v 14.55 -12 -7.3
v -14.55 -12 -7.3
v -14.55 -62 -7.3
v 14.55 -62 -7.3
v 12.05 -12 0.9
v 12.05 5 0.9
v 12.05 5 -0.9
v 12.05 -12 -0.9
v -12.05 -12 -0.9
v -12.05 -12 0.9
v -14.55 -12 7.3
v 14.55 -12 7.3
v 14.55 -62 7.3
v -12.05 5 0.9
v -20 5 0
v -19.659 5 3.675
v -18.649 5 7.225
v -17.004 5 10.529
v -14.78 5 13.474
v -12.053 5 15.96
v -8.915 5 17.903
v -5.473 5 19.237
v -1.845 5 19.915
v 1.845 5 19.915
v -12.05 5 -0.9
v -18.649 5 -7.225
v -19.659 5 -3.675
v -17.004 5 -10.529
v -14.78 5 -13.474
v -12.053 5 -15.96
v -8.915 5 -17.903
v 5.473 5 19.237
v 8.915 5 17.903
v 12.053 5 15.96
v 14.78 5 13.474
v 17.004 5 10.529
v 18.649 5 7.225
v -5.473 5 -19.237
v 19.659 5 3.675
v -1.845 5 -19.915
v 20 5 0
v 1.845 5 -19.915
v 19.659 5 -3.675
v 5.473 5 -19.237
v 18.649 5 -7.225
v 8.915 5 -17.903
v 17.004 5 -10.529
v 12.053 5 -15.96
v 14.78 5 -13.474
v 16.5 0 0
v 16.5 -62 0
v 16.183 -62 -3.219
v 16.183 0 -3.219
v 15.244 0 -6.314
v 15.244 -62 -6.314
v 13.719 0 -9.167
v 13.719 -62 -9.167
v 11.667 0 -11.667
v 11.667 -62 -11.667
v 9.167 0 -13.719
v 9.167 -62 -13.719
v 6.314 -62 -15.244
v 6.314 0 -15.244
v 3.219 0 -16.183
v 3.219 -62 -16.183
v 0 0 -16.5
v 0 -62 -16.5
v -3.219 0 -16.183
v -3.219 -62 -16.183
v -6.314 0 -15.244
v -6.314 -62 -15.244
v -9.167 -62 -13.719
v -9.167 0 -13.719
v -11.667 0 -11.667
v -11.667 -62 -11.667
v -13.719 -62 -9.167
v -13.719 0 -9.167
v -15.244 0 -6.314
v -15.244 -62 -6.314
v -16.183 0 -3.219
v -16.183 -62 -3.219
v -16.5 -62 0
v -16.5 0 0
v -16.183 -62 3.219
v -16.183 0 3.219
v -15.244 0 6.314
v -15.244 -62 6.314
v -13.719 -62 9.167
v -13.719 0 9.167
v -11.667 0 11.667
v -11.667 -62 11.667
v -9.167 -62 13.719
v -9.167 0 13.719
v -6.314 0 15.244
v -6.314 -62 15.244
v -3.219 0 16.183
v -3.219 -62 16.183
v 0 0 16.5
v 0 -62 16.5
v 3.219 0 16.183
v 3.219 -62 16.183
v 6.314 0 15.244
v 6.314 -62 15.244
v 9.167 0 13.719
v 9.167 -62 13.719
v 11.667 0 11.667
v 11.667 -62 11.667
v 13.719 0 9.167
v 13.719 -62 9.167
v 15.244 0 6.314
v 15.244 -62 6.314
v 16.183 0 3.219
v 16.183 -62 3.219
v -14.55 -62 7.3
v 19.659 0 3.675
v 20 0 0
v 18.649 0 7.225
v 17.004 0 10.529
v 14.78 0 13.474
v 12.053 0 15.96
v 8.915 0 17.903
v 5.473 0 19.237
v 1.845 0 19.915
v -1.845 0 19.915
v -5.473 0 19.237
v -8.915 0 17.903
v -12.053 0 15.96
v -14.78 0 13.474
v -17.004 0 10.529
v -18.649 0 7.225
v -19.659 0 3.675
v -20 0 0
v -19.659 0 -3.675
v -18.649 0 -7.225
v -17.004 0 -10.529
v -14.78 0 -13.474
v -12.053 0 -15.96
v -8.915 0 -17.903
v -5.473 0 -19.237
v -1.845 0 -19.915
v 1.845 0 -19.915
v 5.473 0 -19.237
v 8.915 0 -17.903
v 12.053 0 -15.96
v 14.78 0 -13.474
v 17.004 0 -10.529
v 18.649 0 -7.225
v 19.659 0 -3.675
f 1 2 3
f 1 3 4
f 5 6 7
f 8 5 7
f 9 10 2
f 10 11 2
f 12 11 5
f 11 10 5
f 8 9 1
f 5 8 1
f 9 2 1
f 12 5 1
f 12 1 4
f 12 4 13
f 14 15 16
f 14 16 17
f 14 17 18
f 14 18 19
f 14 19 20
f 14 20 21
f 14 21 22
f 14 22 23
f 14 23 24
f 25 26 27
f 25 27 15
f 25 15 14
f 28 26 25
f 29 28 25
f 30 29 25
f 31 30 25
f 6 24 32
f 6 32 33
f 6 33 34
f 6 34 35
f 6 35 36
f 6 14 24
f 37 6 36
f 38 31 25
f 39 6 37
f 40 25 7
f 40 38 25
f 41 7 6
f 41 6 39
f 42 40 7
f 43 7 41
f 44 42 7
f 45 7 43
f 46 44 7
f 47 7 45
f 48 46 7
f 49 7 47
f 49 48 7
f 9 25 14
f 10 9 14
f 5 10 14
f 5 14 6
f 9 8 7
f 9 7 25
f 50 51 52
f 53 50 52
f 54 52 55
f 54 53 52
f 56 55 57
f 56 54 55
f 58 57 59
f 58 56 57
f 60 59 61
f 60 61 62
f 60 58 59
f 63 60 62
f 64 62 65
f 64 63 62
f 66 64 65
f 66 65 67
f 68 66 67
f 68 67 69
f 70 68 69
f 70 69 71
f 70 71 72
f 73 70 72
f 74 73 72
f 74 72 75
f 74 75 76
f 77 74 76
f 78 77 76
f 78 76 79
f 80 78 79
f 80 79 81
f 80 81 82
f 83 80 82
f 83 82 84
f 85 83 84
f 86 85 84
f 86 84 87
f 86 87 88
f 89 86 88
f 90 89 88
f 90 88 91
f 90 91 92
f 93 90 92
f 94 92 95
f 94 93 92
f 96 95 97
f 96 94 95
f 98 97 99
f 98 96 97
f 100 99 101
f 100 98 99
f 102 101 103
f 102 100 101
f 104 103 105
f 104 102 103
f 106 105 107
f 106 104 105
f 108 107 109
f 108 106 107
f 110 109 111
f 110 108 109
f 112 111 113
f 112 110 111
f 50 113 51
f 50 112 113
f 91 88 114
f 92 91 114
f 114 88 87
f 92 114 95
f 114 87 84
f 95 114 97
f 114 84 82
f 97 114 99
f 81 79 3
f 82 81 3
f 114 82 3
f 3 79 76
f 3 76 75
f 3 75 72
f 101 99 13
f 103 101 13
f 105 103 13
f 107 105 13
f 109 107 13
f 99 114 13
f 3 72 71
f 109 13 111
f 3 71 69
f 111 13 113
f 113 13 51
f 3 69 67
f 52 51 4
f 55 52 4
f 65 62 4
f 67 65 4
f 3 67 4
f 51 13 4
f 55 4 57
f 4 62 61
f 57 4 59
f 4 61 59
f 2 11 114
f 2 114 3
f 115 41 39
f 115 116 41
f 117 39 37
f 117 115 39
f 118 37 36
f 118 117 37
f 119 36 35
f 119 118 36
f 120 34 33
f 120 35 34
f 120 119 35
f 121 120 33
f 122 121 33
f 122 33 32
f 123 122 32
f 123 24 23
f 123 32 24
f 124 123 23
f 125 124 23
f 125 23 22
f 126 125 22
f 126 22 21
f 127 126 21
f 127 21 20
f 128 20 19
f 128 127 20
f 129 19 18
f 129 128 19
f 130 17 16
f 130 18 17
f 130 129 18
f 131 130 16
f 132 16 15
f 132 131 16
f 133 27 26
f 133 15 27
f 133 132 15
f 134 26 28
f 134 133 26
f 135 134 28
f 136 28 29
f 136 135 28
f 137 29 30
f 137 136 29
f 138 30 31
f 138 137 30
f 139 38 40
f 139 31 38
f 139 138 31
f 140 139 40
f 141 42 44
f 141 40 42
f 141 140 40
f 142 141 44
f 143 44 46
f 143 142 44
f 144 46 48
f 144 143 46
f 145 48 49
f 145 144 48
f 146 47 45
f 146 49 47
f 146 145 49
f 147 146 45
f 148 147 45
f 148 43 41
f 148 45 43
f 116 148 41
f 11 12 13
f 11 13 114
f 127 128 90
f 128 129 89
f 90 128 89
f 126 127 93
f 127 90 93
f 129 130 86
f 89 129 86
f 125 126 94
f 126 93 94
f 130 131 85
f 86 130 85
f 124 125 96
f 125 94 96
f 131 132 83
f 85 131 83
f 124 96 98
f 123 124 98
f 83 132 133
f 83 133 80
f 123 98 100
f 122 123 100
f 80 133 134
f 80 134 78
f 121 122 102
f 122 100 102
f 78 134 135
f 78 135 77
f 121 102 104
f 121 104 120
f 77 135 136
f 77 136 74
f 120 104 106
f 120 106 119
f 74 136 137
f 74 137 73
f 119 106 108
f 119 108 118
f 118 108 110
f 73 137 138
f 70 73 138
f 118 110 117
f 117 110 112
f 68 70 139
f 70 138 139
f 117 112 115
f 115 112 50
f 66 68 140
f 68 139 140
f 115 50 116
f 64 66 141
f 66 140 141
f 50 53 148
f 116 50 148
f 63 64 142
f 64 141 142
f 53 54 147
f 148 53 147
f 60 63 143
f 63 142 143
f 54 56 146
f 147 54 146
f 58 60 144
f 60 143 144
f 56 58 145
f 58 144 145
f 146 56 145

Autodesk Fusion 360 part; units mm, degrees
sketch "Esquisse1" plane through (0, 0, 0) normal (0, 1, 0) x (1, 0, 0)
  circle A0 centre (0, 0) radius 20
  circle A1 centre (0, 0) radius 16.5
  line L0 (12.05, 0.9) -> (-12.05, 0.9)
  line L1 (-12.05, 0.9) -> (-12.05, -0.9)
  line L2 (-12.05, -0.9) -> (12.05, -0.9)
  line L3 (12.05, -0.9) -> (12.05, 0.9)
  line L4 (12.05, 0.9) -> (-12.05, -0.9) construction
  line L5 (-12.05, 0.9) -> (12.05, -0.9) construction
  line L6 (14.55, -7.3) -> (-14.55, -7.3)
  line L7 (-14.55, -7.3) -> (-14.55, 7.3)
  line L8 (-14.55, 7.3) -> (14.55, 7.3)
  line L9 (14.55, 7.3) -> (14.55, -7.3)
  line L10 (14.55, -7.3) -> (-14.55, 7.3) construction
  line L11 (-14.55, -7.3) -> (14.55, 7.3) construction
  dimension "d1" = 40
  dimension "d2" = 33
  dimension "d3" = 24.1
  dimension "d4" = 1.8
  dimension "d6" = 29.1
  dimension "d7" = 14.6
extrude "Extrusion1" add sketch "Esquisse1" along normal blind 5 contours A0 | A1 | L6 L7 L8 L9
extrude "Extrusion2" add sketch "Esquisse1" against normal blind 12 contours A1 | L6 L7 L8 L9
extrude "Extrusion3" add sketch "Esquisse1" against normal blind 62 contours A1
equation "d3 = 23.9 mm + err"
equation "d4 = 1.6 mm + ( err )"
equation "err = 0.2 mm" comment "erreur de l'impression"
equation "d6 = 28.9 mm + err"
equation "d7 = 14.4 mm + err"
equation "d12 = -12 mm - 50 mm"
